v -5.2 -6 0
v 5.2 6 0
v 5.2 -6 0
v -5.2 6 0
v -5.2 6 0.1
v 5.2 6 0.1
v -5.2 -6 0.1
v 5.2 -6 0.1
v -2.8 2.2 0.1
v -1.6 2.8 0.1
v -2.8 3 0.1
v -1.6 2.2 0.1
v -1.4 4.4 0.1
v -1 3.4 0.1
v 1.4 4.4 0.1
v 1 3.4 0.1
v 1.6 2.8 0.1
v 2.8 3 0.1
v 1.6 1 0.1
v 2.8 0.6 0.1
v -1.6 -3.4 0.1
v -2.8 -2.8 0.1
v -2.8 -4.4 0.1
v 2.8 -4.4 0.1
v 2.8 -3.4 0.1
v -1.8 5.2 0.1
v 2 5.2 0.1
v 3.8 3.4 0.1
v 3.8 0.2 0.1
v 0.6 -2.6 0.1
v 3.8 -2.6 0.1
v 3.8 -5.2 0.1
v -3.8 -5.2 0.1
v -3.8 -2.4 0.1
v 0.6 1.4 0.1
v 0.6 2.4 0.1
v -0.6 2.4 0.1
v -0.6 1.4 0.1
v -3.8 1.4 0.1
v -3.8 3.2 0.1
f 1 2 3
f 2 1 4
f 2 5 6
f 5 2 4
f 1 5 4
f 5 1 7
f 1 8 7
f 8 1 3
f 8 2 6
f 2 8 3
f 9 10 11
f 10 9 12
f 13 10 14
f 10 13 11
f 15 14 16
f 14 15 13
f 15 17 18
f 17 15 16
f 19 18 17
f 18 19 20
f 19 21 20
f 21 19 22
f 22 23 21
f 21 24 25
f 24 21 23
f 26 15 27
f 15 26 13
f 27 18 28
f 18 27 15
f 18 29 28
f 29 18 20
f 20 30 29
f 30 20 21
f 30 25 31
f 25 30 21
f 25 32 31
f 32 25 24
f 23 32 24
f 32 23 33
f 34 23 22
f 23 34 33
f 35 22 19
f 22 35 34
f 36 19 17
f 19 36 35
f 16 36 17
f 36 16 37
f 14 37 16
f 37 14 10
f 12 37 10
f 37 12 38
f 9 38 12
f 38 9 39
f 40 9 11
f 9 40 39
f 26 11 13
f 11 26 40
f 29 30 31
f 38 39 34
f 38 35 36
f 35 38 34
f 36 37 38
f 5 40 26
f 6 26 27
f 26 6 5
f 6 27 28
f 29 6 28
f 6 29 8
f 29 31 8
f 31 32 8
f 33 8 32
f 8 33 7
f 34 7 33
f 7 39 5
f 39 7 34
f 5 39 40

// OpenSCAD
// file: ../p/box5-12.scad
use <../lib.scad>
function ldraw_lib__box5_12() = [
// 0 Box with 5 Faces without Any Edges
// 0 Name: box5-12.dat
// 0 Author: Chris Dee [cwdee]
// 0 !LDRAW_ORG Primitive UPDATE 2009-02
// 0 !LICENSE Licensed under CC BY 4.0 : see CAreadme.txt
// 
// 0 BFC CERTIFY CCW
  [0,"BFC","CERTIFY"],
  [0,"BFC","CCW"],
// 
// 0 !HISTORY 2009-09-03 [PTadmin] Official Update 2009-02
// 
// 
// 4 16 1 1 1 1 1 -1 -1 1 -1 -1 1 1
  [4,16,1,1,1,1,1,-1,-1,1,-1,-1,1,1],
// 4 16 -1 0 1 1 0 1 1 1 1 -1 1 1
  [4,16,-1,0,1,1,0,1,1,1,1,-1,1,1],
// 4 16 -1 0 -1 -1 0 1 -1 1 1 -1 1 -1
  [4,16,-1,0,-1,-1,0,1,-1,1,1,-1,1,-1],
// 4 16 1 0 -1 -1 0 -1 -1 1 -1 1 1 -1
  [4,16,1,0,-1,-1,0,-1,-1,1,-1,1,1,-1],
// 4 16 1 0 1 1 0 -1 1 1 -1 1 1 1
  [4,16,1,0,1,1,0,-1,1,1,-1,1,1,1],
// 0
];
module ldraw_lib__box5_12(step=0, col=false, unit=2/5, alt=false, line=0.2, solid=!$preview)
    makepoly(ldraw_lib__box5_12(), step=step, col=col, unit=unit, alt=alt, line=line, solid=solid);
ldraw_lib__box5_12(line=0.2);
// main file
use <../lib.scad>
use <../p/box5-12.scad>
function ldraw_lib__168175a() = [
// 0 Sticker  1.5 x  1.3 with Black Outlined Yellow "2"
// 0 Name: 168175a.dat
// 0 Author: Takeshi Takahashi [RainbowDolphin]
// 0 !LDRAW_ORG Part UPDATE 2025-07
// 0 !LICENSE Licensed under CC BY 4.0 : see CAreadme.txt
// 
// 0 BFC CERTIFY CCW
  [0,"BFC","CERTIFY"],
  [0,"BFC","CCW"],
// 
// 0 !KEYWORDS boat, Coastal patrol, police, set 6483, ship
// 
// 0 !HISTORY 2025-07-27 [OrionP] Official Update 2025-07
// 
// 1 16 0 -0.25 0 13 0 0 0 0.25 0 0 0 15 box5-12.dat
  [1,16,0,-0.25,0,13,0,0,0,0.25,0,0,0,15, ldraw_lib__box5_12()],
// 4 14 -7 -0.25 7.5 -7 -0.25 5.5 -4 -0.25 5.5 -4 -0.25 7
  [4,14,-7,-0.25,7.5,-7,-0.25,5.5,-4,-0.25,5.5,-4,-0.25,7],
// 4 14 -3.5 -0.25 11 -7 -0.25 7.5 -4 -0.25 7 -2.5 -0.25 8.5
  [4,14,-3.5,-0.25,11,-7,-0.25,7.5,-4,-0.25,7,-2.5,-0.25,8.5],
// 4 14 3.5 -0.25 11 -3.5 -0.25 11 -2.5 -0.25 8.5 2.5 -0.25 8.5
  [4,14,3.5,-0.25,11,-3.5,-0.25,11,-2.5,-0.25,8.5,2.5,-0.25,8.5],
// 4 14 7 -0.25 7.5 3.5 -0.25 11 2.5 -0.25 8.5 4 -0.25 7
  [4,14,7,-0.25,7.5,3.5,-0.25,11,2.5,-0.25,8.5,4,-0.25,7],
// 4 14 7 -0.25 7.5 4 -0.25 7 4 -0.25 2.5 7 -0.25 1.5
  [4,14,7,-0.25,7.5,4,-0.25,7,4,-0.25,2.5,7,-0.25,1.5],
// 4 14 -4 -0.25 -8.5 7 -0.25 1.5 4 -0.25 2.5 -7 -0.25 -7
  [4,14,-4,-0.25,-8.5,7,-0.25,1.5,4,-0.25,2.5,-7,-0.25,-7],
// 3 14 -7 -0.25 -7 -7 -0.25 -11 -4 -0.25 -8.5
  [3,14,-7,-0.25,-7,-7,-0.25,-11,-4,-0.25,-8.5],
// 4 14 -4 -0.25 -8.5 -7 -0.25 -11 7 -0.25 -11 7 -0.25 -8.5
  [4,14,-4,-0.25,-8.5,-7,-0.25,-11,7,-0.25,-11,7,-0.25,-8.5],
// 4 0 -4.5 -0.25 13 -3.5 -0.25 11 3.5 -0.25 11 5 -0.25 13
  [4,0,-4.5,-0.25,13,-3.5,-0.25,11,3.5,-0.25,11,5,-0.25,13],
// 4 0 9.5 -0.25 8.5 5 -0.25 13 3.5 -0.25 11 7 -0.25 7.5
  [4,0,9.5,-0.25,8.5,5,-0.25,13,3.5,-0.25,11,7,-0.25,7.5],
// 4 0 9.5 -0.25 8.5 7 -0.25 7.5 7 -0.25 1.5 9.5 -0.25 0.5
  [4,0,9.5,-0.25,8.5,7,-0.25,7.5,7,-0.25,1.5,9.5,-0.25,0.5],
// 4 0 1.5 -0.25 -6.5 9.5 -0.25 0.5 7 -0.25 1.5 -4 -0.25 -8.5
  [4,0,1.5,-0.25,-6.5,9.5,-0.25,0.5,7,-0.25,1.5,-4,-0.25,-8.5],
// 4 0 1.5 -0.25 -6.5 -4 -0.25 -8.5 7 -0.25 -8.5 9.5 -0.25 -6.5
  [4,0,1.5,-0.25,-6.5,-4,-0.25,-8.5,7,-0.25,-8.5,9.5,-0.25,-6.5],
// 4 0 9.5 -0.25 -13 9.5 -0.25 -6.5 7 -0.25 -8.5 7 -0.25 -11
  [4,0,9.5,-0.25,-13,9.5,-0.25,-6.5,7,-0.25,-8.5,7,-0.25,-11],
// 4 0 -9.5 -0.25 -13 9.5 -0.25 -13 7 -0.25 -11 -7 -0.25 -11
  [4,0,-9.5,-0.25,-13,9.5,-0.25,-13,7,-0.25,-11,-7,-0.25,-11],
// 4 0 -9.5 -0.25 -6 -9.5 -0.25 -13 -7 -0.25 -11 -7 -0.25 -7
  [4,0,-9.5,-0.25,-6,-9.5,-0.25,-13,-7,-0.25,-11,-7,-0.25,-7],
// 4 0 1.5 -0.25 3.5 -9.5 -0.25 -6 -7 -0.25 -7 4 -0.25 2.5
  [4,0,1.5,-0.25,3.5,-9.5,-0.25,-6,-7,-0.25,-7,4,-0.25,2.5],
// 4 0 1.5 -0.25 3.5 4 -0.25 2.5 4 -0.25 7 1.5 -0.25 6
  [4,0,1.5,-0.25,3.5,4,-0.25,2.5,4,-0.25,7,1.5,-0.25,6],
// 4 0 1.5 -0.25 6 4 -0.25 7 2.5 -0.25 8.5 -1.5 -0.25 6
  [4,0,1.5,-0.25,6,4,-0.25,7,2.5,-0.25,8.5,-1.5,-0.25,6],
// 4 0 -1.5 -0.25 6 2.5 -0.25 8.5 -2.5 -0.25 8.5 -4 -0.25 7
  [4,0,-1.5,-0.25,6,2.5,-0.25,8.5,-2.5,-0.25,8.5,-4,-0.25,7],
// 4 0 -1.5 -0.25 6 -4 -0.25 7 -4 -0.25 5.5 -1.5 -0.25 3.5
  [4,0,-1.5,-0.25,6,-4,-0.25,7,-4,-0.25,5.5,-1.5,-0.25,3.5],
// 4 0 -9.5 -0.25 3.5 -1.5 -0.25 3.5 -4 -0.25 5.5 -7 -0.25 5.5
  [4,0,-9.5,-0.25,3.5,-1.5,-0.25,3.5,-4,-0.25,5.5,-7,-0.25,5.5],
// 4 0 -9.5 -0.25 8 -9.5 -0.25 3.5 -7 -0.25 5.5 -7 -0.25 7.5
  [4,0,-9.5,-0.25,8,-9.5,-0.25,3.5,-7,-0.25,5.5,-7,-0.25,7.5],
// 4 0 -4.5 -0.25 13 -9.5 -0.25 8 -7 -0.25 7.5 -3.5 -0.25 11
  [4,0,-4.5,-0.25,13,-9.5,-0.25,8,-7,-0.25,7.5,-3.5,-0.25,11],
// 3 16 9.5 -0.25 0.5 1.5 -0.25 -6.5 9.5 -0.25 -6.5
  [3,16,9.5,-0.25,0.5,1.5,-0.25,-6.5,9.5,-0.25,-6.5],
// 3 16 -1.5 -0.25 3.5 -9.5 -0.25 3.5 -9.5 -0.25 -6
  [3,16,-1.5,-0.25,3.5,-9.5,-0.25,3.5,-9.5,-0.25,-6],
// 4 16 -1.5 -0.25 3.5 -9.5 -0.25 -6 1.5 -0.25 3.5 1.5 -0.25 6
  [4,16,-1.5,-0.25,3.5,-9.5,-0.25,-6,1.5,-0.25,3.5,1.5,-0.25,6],
// 3 16 1.5 -0.25 6 -1.5 -0.25 6 -1.5 -0.25 3.5
  [3,16,1.5,-0.25,6,-1.5,-0.25,6,-1.5,-0.25,3.5],
// 3 16 -13 -0.25 15 -9.5 -0.25 8 -4.5 -0.25 13
  [3,16,-13,-0.25,15,-9.5,-0.25,8,-4.5,-0.25,13],
// 4 16 -13 -0.25 15 -4.5 -0.25 13 5 -0.25 13 13 -0.25 15
  [4,16,-13,-0.25,15,-4.5,-0.25,13,5,-0.25,13,13,-0.25,15],
// 3 16 13 -0.25 15 5 -0.25 13 9.5 -0.25 8.5
  [3,16,13,-0.25,15,5,-0.25,13,9.5,-0.25,8.5],
// 4 16 13 -0.25 15 9.5 -0.25 8.5 9.5 -0.25 0.5 13 -0.25 -15
  [4,16,13,-0.25,15,9.5,-0.25,8.5,9.5,-0.25,0.5,13,-0.25,-15],
// 3 16 9.5 -0.25 0.5 9.5 -0.25 -6.5 13 -0.25 -15
  [3,16,9.5,-0.25,0.5,9.5,-0.25,-6.5,13,-0.25,-15],
// 3 16 9.5 -0.25 -6.5 9.5 -0.25 -13 13 -0.25 -15
  [3,16,9.5,-0.25,-6.5,9.5,-0.25,-13,13,-0.25,-15],
// 4 16 13 -0.25 -15 9.5 -0.25 -13 -9.5 -0.25 -13 -13 -0.25 -15
  [4,16,13,-0.25,-15,9.5,-0.25,-13,-9.5,-0.25,-13,-13,-0.25,-15],
// 3 16 -9.5 -0.25 -6 -13 -0.25 -15 -9.5 -0.25 -13
  [3,16,-9.5,-0.25,-6,-13,-0.25,-15,-9.5,-0.25,-13],
// 4 16 -13 -0.25 -15 -9.5 -0.25 -6 -9.5 -0.25 3.5 -13 -0.25 15
  [4,16,-13,-0.25,-15,-9.5,-0.25,-6,-9.5,-0.25,3.5,-13,-0.25,15],
// 3 16 -13 -0.25 15 -9.5 -0.25 3.5 -9.5 -0.25 8
  [3,16,-13,-0.25,15,-9.5,-0.25,3.5,-9.5,-0.25,8],
];
module ldraw_lib__168175a(step=0, col=false, unit=2/5, alt=false, line=0.2, solid=!$preview)
    makepoly(ldraw_lib__168175a(), step=step, col=col, unit=unit, alt=alt, line=line, solid=solid);
ldraw_lib__168175a(line=0.2);
